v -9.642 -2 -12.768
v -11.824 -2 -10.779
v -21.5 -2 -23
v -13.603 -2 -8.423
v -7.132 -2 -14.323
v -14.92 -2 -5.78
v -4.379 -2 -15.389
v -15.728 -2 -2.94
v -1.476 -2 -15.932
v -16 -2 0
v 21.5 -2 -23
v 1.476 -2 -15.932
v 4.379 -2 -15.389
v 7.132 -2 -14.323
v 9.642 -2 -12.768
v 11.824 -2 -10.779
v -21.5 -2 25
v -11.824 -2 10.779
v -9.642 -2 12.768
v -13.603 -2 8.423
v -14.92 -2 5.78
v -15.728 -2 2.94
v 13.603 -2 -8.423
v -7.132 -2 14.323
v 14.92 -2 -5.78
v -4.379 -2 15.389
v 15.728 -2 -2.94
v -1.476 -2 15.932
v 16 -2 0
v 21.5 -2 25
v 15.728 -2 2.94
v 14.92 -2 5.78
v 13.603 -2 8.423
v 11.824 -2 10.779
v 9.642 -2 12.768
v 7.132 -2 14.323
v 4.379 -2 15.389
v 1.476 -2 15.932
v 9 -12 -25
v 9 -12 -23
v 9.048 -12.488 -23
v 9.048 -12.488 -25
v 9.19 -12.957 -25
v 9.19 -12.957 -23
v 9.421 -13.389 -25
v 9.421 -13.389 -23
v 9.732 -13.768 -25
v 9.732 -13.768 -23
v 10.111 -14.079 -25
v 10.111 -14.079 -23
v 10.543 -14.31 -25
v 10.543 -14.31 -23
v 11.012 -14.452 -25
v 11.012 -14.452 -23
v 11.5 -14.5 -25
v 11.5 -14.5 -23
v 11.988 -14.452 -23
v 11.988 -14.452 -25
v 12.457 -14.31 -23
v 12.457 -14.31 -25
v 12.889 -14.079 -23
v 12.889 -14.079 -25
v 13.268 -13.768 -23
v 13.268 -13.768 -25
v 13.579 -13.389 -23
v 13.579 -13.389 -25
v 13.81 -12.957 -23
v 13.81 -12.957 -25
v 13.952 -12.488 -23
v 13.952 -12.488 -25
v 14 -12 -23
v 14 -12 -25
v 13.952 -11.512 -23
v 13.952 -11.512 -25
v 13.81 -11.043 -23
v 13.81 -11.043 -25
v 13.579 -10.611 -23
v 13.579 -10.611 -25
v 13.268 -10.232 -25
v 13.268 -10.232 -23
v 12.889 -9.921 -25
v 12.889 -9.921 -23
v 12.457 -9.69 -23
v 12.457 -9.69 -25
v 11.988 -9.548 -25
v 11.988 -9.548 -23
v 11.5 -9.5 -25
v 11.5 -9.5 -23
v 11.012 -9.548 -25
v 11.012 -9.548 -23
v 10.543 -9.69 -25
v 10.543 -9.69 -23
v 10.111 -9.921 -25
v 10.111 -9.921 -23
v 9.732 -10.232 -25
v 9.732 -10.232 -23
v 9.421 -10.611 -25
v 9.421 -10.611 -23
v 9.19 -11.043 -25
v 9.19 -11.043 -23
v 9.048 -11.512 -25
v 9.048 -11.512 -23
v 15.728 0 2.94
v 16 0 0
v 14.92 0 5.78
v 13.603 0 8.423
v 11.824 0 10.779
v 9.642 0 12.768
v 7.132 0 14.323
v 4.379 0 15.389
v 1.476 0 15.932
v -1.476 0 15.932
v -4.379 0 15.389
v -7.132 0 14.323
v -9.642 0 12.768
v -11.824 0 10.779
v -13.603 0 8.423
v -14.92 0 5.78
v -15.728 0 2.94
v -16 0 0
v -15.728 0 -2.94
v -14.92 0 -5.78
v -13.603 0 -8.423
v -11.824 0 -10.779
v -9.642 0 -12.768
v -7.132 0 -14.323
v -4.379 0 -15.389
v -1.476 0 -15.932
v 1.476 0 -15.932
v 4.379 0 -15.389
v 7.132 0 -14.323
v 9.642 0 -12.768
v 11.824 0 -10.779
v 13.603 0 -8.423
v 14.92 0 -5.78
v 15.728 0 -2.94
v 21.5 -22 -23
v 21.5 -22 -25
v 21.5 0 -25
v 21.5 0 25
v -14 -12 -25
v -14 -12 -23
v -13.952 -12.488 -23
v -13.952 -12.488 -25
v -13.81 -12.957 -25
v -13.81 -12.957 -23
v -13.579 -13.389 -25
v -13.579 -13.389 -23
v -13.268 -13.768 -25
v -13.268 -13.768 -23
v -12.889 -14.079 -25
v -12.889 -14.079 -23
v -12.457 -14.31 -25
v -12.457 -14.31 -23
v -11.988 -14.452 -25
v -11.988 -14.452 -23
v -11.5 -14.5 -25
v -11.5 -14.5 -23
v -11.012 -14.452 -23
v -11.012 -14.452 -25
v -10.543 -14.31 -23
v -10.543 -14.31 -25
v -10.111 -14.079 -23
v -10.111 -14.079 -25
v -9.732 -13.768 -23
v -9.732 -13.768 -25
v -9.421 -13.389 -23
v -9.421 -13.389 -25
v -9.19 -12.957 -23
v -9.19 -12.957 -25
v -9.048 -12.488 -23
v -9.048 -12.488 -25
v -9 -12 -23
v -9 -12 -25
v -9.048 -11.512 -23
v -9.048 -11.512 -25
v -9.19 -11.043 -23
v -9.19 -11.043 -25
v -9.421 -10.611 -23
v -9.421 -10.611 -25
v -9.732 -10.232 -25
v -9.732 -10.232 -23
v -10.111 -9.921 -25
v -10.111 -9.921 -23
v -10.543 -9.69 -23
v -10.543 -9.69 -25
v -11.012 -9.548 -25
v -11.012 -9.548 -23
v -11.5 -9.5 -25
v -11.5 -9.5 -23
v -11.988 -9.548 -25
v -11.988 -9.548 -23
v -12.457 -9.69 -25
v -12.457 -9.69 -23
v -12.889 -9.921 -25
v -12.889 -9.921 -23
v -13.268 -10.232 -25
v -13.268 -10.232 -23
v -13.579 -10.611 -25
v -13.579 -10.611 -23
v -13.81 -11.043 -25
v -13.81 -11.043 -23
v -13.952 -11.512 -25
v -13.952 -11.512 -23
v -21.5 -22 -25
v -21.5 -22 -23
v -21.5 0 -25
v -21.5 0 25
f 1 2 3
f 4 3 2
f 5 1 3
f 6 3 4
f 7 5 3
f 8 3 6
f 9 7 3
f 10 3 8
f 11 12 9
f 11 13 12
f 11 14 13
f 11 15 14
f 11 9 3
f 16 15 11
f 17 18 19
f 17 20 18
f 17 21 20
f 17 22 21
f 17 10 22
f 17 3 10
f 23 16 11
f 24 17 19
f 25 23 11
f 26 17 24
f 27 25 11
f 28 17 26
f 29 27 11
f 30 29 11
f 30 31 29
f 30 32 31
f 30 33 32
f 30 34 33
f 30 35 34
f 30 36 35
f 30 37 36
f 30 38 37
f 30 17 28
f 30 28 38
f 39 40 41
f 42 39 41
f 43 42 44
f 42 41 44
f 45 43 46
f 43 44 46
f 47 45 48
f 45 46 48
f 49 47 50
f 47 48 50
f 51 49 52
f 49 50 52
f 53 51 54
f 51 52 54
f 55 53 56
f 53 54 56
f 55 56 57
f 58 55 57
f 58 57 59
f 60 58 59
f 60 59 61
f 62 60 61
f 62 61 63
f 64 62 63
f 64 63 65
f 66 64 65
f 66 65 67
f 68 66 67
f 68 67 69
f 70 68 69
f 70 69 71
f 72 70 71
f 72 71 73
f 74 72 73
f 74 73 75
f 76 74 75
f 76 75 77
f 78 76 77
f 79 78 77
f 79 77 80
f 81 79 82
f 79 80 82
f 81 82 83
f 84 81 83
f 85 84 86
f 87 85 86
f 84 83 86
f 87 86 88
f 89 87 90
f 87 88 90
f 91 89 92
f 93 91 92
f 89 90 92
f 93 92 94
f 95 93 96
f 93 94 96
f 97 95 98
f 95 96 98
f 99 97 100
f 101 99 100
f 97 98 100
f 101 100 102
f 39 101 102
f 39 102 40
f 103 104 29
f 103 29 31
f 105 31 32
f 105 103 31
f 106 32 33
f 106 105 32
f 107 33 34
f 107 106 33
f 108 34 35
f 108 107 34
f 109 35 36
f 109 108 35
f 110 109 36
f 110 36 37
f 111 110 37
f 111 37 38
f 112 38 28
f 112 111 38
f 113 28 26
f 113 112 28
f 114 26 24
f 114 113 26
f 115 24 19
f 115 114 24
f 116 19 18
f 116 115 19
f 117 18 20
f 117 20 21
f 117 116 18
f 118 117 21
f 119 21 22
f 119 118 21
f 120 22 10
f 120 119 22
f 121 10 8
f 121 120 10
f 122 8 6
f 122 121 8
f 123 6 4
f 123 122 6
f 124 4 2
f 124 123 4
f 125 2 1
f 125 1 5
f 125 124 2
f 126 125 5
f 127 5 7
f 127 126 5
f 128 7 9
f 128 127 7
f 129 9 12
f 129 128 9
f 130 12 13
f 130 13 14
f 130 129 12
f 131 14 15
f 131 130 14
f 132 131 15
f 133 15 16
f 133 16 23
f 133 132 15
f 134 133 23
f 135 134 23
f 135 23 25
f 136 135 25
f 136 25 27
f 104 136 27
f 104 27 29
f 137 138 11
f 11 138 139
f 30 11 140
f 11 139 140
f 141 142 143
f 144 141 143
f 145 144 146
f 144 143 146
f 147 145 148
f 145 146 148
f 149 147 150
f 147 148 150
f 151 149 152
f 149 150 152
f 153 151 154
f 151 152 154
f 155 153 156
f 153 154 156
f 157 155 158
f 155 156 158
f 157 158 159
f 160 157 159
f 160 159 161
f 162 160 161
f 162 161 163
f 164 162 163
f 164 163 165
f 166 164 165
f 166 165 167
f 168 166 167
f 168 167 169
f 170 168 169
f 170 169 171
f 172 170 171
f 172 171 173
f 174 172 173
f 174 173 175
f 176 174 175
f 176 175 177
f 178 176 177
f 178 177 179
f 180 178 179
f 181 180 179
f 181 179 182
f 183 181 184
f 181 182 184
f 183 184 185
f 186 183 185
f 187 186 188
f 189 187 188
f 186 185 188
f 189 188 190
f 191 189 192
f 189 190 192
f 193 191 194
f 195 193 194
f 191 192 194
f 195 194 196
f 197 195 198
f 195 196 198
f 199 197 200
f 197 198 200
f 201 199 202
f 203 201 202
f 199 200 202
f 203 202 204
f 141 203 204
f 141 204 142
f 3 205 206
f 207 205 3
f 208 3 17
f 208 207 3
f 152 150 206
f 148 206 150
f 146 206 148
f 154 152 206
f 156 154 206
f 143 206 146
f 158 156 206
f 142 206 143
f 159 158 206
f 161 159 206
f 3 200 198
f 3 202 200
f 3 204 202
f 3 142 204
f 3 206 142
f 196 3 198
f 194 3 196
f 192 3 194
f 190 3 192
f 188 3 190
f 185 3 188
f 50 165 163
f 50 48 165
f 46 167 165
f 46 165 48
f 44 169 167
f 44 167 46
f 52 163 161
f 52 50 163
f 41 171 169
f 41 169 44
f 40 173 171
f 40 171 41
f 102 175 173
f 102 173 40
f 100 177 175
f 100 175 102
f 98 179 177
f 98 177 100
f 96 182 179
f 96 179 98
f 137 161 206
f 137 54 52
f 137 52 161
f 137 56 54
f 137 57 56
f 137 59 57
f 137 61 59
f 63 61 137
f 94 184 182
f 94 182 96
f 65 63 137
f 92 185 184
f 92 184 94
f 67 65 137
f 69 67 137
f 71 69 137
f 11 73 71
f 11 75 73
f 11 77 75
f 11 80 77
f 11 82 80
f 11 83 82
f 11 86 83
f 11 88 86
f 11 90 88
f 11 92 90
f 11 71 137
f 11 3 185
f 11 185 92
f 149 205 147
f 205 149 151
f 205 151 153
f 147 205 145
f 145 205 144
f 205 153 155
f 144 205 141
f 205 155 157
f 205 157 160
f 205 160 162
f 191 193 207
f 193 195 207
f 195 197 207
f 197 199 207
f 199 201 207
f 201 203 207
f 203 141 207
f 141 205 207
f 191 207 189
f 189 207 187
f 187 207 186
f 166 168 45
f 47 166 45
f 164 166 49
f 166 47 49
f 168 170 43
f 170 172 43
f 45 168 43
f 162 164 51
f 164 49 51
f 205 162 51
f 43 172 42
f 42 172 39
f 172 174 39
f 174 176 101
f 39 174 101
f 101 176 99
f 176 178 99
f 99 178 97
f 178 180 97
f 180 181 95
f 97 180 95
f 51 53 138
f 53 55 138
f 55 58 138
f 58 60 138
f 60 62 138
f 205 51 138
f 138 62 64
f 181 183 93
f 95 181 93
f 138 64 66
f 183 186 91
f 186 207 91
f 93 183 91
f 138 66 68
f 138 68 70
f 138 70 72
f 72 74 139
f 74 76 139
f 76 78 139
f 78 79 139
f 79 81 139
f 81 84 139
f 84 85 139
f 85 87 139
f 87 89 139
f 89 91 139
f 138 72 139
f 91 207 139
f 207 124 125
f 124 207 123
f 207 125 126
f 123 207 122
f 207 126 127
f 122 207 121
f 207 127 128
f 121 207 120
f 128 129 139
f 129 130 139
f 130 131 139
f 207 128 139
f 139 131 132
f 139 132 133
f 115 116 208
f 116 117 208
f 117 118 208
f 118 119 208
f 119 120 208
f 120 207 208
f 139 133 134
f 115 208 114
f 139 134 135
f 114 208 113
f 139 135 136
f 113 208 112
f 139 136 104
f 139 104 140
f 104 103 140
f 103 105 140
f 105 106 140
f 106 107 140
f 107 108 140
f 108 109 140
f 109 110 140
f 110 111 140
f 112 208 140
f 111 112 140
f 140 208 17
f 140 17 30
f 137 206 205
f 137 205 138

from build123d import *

# Parameters (mm, degrees)
F0_W     = 43
F0_H     = 50
F0_R     = 16
F1_DEPTH = 2
F2_W     = 43
F2_H     = 2
F3_DEPTH = 20
F5_D     = 5


with BuildPart() as f1:
    # F0 (on Front) → F1 (new body)
    with BuildSketch(Plane.XZ):
        Rectangle(F0_W, F0_H)
        Circle(F0_R, mode=Mode.SUBTRACT)
    extrude(amount=F1_DEPTH)

    # F2 (on face) → F3 (join)
    with BuildSketch(Plane.XZ.offset(2)):
        with Locations((0, -24)):
            Rectangle(F2_W, F2_H)
    extrude(amount=F3_DEPTH)

    # F5 (through all)
    with Locations(Plane(origin=(0, 0, -25), x_dir=(1, 0, 0), z_dir=(0, 0, -1))):
        with Locations((-11.5, 12), (11.5, 12)):
            Hole(F5_D / 2)


solid = f1.part
